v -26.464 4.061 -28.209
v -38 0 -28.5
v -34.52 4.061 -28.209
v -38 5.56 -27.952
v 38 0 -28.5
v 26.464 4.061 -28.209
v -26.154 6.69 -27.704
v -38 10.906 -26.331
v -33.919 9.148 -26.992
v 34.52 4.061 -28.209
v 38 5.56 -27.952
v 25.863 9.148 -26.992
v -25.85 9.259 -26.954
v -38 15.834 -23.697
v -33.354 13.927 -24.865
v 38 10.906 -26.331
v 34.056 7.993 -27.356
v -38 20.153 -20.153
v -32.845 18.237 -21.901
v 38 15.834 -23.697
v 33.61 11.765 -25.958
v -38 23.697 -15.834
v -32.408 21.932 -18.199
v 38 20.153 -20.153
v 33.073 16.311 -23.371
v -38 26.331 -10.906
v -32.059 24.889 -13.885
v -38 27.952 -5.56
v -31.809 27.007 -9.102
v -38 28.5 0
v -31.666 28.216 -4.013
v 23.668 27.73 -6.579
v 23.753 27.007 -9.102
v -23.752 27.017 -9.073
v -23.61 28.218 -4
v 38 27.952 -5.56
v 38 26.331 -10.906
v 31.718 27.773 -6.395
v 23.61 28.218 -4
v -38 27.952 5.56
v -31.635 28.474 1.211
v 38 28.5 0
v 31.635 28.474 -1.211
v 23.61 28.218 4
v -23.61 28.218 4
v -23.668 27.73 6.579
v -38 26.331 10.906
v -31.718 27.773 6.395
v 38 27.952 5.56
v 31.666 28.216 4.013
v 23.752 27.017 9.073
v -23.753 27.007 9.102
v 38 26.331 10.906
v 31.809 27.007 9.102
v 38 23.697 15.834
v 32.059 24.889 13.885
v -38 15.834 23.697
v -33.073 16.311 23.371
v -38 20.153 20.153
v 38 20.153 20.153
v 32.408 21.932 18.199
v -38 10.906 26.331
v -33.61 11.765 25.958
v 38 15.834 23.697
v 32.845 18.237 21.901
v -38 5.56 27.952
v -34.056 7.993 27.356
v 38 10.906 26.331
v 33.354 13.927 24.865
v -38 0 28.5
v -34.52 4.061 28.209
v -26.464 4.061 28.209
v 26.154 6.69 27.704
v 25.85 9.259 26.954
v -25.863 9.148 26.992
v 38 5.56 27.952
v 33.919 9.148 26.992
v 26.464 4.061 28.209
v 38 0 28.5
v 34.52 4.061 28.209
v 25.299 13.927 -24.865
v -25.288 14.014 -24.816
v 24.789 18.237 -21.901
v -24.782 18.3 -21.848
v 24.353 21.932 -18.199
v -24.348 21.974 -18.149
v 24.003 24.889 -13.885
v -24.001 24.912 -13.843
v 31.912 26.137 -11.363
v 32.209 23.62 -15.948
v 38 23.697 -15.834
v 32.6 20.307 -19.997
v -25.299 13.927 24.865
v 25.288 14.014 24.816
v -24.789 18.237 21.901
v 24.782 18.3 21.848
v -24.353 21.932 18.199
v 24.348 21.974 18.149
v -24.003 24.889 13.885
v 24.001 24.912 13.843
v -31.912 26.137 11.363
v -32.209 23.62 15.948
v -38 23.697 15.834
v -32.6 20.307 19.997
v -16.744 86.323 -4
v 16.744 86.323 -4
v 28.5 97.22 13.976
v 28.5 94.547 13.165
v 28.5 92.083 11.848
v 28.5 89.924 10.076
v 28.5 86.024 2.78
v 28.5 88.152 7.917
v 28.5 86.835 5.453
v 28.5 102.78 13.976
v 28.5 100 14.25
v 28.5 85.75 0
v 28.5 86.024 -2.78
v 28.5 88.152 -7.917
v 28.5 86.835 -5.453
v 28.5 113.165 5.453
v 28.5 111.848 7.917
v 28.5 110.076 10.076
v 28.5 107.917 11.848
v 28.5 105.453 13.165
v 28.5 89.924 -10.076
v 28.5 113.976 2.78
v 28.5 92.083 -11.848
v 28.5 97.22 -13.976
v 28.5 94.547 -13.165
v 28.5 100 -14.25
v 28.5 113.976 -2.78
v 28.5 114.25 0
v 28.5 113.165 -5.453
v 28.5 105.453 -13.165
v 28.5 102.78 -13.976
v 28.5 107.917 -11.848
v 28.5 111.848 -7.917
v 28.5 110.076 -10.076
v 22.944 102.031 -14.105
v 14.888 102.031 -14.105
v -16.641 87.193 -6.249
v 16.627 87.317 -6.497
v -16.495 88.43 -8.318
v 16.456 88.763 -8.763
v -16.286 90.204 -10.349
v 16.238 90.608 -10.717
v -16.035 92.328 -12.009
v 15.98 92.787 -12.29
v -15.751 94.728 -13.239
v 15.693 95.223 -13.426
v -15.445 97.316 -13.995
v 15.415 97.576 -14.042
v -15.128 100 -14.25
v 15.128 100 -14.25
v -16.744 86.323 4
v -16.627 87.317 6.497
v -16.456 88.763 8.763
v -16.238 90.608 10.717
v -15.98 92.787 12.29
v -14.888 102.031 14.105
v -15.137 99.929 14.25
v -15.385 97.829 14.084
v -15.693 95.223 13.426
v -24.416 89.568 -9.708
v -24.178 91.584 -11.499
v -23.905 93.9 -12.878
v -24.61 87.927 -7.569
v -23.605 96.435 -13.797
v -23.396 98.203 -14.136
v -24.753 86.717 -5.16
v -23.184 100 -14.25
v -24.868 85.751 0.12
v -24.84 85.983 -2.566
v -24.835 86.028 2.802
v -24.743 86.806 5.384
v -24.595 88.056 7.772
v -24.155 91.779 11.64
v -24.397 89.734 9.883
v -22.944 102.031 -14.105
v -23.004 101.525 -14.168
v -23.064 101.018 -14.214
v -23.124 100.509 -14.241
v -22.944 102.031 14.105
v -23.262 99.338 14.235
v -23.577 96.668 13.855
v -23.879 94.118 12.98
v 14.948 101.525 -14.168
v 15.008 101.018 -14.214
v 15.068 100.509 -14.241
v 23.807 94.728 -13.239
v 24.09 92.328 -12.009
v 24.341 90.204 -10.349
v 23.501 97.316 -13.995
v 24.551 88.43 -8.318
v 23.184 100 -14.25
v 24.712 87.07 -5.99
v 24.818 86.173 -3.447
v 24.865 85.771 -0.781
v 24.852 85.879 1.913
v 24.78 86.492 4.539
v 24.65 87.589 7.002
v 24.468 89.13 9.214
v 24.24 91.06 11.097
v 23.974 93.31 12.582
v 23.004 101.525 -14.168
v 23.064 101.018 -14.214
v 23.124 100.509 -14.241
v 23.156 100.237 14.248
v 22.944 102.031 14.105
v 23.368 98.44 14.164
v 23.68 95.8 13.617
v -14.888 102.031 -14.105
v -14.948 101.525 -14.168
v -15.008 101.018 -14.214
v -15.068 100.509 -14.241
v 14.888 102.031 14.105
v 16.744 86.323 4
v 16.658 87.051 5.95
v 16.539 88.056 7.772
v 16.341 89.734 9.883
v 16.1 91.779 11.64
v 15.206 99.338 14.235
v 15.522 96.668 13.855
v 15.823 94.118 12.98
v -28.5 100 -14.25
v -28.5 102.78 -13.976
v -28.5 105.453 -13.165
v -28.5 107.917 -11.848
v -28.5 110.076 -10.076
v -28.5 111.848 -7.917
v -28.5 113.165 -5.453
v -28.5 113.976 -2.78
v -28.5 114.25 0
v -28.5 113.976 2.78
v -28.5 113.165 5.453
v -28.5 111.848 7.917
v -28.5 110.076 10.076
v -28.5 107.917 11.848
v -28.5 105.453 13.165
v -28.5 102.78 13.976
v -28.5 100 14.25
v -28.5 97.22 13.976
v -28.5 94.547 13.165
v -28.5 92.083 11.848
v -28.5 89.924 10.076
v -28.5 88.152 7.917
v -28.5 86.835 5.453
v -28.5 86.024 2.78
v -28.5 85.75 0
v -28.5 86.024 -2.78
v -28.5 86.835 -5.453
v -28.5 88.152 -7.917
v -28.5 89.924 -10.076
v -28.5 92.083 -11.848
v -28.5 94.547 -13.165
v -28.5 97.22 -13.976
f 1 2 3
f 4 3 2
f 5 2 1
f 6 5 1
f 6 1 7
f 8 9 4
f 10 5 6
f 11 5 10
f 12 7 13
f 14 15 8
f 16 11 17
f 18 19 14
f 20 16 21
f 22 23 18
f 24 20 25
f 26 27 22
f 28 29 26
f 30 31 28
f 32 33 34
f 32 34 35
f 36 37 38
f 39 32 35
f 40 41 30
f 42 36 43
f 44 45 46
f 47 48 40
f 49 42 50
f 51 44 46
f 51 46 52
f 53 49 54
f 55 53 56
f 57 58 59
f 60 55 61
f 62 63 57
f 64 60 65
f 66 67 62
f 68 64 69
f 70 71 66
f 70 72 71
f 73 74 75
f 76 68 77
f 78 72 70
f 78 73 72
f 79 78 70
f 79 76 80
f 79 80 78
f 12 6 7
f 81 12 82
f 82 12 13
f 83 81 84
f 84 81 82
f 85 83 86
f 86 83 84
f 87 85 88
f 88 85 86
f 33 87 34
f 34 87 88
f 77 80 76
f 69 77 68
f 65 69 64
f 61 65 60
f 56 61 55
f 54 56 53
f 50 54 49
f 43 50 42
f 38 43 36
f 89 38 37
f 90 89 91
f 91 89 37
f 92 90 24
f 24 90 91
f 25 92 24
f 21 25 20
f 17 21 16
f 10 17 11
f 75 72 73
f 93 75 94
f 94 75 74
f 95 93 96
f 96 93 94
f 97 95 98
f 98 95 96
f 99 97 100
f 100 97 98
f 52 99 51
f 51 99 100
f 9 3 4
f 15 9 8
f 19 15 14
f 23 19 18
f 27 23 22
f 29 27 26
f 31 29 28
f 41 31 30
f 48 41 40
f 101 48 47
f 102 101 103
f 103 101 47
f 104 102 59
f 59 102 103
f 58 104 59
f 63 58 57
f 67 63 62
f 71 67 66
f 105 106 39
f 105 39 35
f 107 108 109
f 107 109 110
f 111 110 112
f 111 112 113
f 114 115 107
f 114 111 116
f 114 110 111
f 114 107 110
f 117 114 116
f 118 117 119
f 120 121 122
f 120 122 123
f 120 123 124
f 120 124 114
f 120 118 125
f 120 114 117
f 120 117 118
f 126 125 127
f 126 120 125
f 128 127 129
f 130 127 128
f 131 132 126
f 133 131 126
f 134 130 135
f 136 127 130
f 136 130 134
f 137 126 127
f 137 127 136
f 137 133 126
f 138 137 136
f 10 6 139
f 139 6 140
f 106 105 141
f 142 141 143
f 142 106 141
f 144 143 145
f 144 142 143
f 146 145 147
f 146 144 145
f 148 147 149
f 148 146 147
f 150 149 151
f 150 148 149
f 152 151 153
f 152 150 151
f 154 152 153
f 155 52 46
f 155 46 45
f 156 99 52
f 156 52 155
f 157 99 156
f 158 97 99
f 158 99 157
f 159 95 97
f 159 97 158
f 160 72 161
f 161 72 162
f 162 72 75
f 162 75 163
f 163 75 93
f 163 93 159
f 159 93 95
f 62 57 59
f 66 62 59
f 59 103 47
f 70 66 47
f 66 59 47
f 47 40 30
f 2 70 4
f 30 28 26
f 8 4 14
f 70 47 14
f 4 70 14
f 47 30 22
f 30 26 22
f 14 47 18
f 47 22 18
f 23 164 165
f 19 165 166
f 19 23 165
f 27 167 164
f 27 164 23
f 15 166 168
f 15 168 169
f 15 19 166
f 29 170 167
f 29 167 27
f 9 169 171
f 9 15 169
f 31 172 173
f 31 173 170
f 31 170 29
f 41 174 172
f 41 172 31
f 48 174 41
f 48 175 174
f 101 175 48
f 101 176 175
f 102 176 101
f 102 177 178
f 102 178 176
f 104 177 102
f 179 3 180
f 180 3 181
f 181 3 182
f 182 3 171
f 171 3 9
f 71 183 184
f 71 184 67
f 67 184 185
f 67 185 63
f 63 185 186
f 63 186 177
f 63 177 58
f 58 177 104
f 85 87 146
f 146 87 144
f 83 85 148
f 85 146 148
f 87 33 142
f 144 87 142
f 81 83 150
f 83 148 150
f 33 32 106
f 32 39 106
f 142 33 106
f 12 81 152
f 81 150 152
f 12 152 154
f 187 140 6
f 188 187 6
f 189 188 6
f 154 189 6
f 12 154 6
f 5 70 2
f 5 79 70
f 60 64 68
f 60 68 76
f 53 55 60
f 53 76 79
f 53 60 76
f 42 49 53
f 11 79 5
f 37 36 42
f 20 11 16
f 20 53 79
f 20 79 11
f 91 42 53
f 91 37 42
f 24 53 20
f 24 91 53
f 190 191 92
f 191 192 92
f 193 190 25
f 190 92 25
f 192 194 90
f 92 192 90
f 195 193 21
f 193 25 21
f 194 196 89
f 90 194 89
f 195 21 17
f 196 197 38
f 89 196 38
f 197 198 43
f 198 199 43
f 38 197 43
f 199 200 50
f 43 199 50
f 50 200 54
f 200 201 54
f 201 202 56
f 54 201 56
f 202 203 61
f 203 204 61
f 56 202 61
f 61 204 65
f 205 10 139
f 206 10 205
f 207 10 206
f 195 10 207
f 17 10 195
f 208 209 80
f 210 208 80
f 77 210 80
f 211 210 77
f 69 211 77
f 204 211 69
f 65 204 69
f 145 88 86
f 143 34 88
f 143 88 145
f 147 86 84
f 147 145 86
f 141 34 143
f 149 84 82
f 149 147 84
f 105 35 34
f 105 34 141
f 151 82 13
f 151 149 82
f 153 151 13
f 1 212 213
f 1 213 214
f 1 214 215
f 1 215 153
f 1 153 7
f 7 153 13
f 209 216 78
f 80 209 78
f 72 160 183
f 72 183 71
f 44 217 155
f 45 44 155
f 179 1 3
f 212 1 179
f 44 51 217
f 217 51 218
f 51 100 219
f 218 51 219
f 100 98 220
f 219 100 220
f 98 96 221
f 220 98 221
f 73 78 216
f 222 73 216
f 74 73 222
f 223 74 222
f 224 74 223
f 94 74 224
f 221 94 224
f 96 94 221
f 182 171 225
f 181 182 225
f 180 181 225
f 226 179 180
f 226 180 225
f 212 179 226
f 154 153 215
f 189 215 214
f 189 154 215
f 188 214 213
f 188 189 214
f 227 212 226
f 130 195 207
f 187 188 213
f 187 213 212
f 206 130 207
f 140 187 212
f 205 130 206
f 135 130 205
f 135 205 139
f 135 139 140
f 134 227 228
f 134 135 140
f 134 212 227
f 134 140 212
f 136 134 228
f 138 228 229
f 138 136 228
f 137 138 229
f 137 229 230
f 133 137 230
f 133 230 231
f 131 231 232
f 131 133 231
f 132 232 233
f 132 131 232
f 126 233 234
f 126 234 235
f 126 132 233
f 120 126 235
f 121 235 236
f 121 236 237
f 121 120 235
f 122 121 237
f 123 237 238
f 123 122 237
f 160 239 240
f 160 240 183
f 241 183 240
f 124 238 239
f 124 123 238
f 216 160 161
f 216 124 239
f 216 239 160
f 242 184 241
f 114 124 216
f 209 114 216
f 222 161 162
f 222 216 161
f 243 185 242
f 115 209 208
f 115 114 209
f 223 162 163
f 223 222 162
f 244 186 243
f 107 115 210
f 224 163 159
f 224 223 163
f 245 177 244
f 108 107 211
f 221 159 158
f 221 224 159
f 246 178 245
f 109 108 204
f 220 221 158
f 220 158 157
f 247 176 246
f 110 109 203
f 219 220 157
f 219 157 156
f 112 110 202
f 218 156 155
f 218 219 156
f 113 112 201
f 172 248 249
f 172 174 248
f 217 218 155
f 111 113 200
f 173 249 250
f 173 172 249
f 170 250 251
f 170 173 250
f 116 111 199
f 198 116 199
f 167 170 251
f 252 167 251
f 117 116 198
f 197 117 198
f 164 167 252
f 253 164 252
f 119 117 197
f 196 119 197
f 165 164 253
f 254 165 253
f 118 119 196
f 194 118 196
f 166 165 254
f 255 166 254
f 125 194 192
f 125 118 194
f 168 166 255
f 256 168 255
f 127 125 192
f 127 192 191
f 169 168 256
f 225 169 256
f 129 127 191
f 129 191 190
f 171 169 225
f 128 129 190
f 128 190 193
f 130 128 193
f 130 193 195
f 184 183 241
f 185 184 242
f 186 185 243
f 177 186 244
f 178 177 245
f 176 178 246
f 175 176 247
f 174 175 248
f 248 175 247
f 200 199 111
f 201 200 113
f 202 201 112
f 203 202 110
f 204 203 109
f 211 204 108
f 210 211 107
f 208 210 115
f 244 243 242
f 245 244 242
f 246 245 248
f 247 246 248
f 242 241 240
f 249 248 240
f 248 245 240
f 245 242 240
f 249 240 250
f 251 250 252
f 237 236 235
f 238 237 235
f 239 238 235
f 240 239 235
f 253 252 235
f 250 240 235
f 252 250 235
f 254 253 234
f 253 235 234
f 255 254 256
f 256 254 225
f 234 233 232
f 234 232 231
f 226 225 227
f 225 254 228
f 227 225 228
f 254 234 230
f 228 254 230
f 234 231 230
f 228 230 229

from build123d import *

# Parameters (mm, degrees)
SKETCH1_R                = 14.25
BOSS_EXTRUDE1_DEPTH      = 28.5
BOSS_EXTRUDE2_DEPTH      = 38
BOSS_EXTRUDE3_DEPTH      = 28.5
BOSS_EXTRUDE3_DEPTH_BACK = 28.5
SKETCH3_OUTSIDE_W        = 88.718
SKETCH3_OUTSIDE_H        = 145.968
CUT_EXTRUDE1_DEPTH       = 39
BOSS_EXTRUDE5_DEPTH      = 4


with BuildPart() as part:
    # Sketch1 → Boss-Extrude1 (new body, symmetric)
    with BuildSketch(Plane(origin=(0, 0, 0), x_dir=(0, 0, -1), z_dir=(1, 0, 0))):
        with Locations((0, 100)):
            Circle(SKETCH1_R)
    extrude(amount=BOSS_EXTRUDE1_DEPTH, both=True)



with BuildPart() as body_2:
    # Sketch1<3> → Boss-Extrude2 (new body, symmetric)
    with BuildSketch(Plane(origin=(0, 0, 0), x_dir=(0, 0, -1), z_dir=(1, 0, 0))):
        with BuildLine():
            Line((-28.5, 0), (28.5, 0))
            ThreePointArc((28.5, 0), (0, 28.5), (-28.5, 0))
        make_face()
    extrude(amount=BOSS_EXTRUDE2_DEPTH, both=True)


with BuildPart() as body_3:
    # Sketch2 → Boss-Extrude3 (new body, two sides)
    with BuildSketch(Plane.XY) as boss_extrude3_sk:
        Polygon((13.444344632, 114.25), (21.5, 114.25), (35, 0), (26.944344632, 0), align=None)
    extrude(amount=BOSS_EXTRUDE3_DEPTH)
    extrude(boss_extrude3_sk.sketch, amount=-BOSS_EXTRUDE3_DEPTH_BACK)

    # Sketch3 outside → Cut-Extrude1 (cut, through all)
    with BuildSketch(Plane(origin=(0, 0, 0), x_dir=(0, 0, -1), z_dir=(1, 0, 0))):
        with Locations((0, 57.125)):
            Rectangle(SKETCH3_OUTSIDE_W, SKETCH3_OUTSIDE_H)
        Polygon((14.104575928, 102.030625), (-14.104575928, 102.030625), (-28.209151856, 4.06125), (28.209151856, 4.06125), align=None, mode=Mode.SUBTRACT)
    extrude(amount=CUT_EXTRUDE1_DEPTH, mode=Mode.SUBTRACT)


with BuildPart() as body_4:
    # Mirror1: mirrored copy
    add(body_3.part.mirror(Plane(origin=(0, 0, 0), x_dir=(0, 0, 1), z_dir=(1, 0, 0))))


with BuildPart() as part_1:
    add(part.part)

    add(body_2.part)  # Boss-Extrude5 merges body 2

    add(body_3.part)  # Boss-Extrude5 merges body 3

    add(body_4.part)  # Boss-Extrude5 merges body 4
    # Sketch4 → Boss-Extrude5 (add, symmetric)
    with BuildSketch(Plane.XY):
        Polygon((-14.888209512, 102.030625), (14.888209512, 102.030625), (26.464459512, 4.06125), (-26.464459512, 4.06125), align=None)
    extrude(amount=BOSS_EXTRUDE5_DEPTH, both=True)


solid = part_1.part
